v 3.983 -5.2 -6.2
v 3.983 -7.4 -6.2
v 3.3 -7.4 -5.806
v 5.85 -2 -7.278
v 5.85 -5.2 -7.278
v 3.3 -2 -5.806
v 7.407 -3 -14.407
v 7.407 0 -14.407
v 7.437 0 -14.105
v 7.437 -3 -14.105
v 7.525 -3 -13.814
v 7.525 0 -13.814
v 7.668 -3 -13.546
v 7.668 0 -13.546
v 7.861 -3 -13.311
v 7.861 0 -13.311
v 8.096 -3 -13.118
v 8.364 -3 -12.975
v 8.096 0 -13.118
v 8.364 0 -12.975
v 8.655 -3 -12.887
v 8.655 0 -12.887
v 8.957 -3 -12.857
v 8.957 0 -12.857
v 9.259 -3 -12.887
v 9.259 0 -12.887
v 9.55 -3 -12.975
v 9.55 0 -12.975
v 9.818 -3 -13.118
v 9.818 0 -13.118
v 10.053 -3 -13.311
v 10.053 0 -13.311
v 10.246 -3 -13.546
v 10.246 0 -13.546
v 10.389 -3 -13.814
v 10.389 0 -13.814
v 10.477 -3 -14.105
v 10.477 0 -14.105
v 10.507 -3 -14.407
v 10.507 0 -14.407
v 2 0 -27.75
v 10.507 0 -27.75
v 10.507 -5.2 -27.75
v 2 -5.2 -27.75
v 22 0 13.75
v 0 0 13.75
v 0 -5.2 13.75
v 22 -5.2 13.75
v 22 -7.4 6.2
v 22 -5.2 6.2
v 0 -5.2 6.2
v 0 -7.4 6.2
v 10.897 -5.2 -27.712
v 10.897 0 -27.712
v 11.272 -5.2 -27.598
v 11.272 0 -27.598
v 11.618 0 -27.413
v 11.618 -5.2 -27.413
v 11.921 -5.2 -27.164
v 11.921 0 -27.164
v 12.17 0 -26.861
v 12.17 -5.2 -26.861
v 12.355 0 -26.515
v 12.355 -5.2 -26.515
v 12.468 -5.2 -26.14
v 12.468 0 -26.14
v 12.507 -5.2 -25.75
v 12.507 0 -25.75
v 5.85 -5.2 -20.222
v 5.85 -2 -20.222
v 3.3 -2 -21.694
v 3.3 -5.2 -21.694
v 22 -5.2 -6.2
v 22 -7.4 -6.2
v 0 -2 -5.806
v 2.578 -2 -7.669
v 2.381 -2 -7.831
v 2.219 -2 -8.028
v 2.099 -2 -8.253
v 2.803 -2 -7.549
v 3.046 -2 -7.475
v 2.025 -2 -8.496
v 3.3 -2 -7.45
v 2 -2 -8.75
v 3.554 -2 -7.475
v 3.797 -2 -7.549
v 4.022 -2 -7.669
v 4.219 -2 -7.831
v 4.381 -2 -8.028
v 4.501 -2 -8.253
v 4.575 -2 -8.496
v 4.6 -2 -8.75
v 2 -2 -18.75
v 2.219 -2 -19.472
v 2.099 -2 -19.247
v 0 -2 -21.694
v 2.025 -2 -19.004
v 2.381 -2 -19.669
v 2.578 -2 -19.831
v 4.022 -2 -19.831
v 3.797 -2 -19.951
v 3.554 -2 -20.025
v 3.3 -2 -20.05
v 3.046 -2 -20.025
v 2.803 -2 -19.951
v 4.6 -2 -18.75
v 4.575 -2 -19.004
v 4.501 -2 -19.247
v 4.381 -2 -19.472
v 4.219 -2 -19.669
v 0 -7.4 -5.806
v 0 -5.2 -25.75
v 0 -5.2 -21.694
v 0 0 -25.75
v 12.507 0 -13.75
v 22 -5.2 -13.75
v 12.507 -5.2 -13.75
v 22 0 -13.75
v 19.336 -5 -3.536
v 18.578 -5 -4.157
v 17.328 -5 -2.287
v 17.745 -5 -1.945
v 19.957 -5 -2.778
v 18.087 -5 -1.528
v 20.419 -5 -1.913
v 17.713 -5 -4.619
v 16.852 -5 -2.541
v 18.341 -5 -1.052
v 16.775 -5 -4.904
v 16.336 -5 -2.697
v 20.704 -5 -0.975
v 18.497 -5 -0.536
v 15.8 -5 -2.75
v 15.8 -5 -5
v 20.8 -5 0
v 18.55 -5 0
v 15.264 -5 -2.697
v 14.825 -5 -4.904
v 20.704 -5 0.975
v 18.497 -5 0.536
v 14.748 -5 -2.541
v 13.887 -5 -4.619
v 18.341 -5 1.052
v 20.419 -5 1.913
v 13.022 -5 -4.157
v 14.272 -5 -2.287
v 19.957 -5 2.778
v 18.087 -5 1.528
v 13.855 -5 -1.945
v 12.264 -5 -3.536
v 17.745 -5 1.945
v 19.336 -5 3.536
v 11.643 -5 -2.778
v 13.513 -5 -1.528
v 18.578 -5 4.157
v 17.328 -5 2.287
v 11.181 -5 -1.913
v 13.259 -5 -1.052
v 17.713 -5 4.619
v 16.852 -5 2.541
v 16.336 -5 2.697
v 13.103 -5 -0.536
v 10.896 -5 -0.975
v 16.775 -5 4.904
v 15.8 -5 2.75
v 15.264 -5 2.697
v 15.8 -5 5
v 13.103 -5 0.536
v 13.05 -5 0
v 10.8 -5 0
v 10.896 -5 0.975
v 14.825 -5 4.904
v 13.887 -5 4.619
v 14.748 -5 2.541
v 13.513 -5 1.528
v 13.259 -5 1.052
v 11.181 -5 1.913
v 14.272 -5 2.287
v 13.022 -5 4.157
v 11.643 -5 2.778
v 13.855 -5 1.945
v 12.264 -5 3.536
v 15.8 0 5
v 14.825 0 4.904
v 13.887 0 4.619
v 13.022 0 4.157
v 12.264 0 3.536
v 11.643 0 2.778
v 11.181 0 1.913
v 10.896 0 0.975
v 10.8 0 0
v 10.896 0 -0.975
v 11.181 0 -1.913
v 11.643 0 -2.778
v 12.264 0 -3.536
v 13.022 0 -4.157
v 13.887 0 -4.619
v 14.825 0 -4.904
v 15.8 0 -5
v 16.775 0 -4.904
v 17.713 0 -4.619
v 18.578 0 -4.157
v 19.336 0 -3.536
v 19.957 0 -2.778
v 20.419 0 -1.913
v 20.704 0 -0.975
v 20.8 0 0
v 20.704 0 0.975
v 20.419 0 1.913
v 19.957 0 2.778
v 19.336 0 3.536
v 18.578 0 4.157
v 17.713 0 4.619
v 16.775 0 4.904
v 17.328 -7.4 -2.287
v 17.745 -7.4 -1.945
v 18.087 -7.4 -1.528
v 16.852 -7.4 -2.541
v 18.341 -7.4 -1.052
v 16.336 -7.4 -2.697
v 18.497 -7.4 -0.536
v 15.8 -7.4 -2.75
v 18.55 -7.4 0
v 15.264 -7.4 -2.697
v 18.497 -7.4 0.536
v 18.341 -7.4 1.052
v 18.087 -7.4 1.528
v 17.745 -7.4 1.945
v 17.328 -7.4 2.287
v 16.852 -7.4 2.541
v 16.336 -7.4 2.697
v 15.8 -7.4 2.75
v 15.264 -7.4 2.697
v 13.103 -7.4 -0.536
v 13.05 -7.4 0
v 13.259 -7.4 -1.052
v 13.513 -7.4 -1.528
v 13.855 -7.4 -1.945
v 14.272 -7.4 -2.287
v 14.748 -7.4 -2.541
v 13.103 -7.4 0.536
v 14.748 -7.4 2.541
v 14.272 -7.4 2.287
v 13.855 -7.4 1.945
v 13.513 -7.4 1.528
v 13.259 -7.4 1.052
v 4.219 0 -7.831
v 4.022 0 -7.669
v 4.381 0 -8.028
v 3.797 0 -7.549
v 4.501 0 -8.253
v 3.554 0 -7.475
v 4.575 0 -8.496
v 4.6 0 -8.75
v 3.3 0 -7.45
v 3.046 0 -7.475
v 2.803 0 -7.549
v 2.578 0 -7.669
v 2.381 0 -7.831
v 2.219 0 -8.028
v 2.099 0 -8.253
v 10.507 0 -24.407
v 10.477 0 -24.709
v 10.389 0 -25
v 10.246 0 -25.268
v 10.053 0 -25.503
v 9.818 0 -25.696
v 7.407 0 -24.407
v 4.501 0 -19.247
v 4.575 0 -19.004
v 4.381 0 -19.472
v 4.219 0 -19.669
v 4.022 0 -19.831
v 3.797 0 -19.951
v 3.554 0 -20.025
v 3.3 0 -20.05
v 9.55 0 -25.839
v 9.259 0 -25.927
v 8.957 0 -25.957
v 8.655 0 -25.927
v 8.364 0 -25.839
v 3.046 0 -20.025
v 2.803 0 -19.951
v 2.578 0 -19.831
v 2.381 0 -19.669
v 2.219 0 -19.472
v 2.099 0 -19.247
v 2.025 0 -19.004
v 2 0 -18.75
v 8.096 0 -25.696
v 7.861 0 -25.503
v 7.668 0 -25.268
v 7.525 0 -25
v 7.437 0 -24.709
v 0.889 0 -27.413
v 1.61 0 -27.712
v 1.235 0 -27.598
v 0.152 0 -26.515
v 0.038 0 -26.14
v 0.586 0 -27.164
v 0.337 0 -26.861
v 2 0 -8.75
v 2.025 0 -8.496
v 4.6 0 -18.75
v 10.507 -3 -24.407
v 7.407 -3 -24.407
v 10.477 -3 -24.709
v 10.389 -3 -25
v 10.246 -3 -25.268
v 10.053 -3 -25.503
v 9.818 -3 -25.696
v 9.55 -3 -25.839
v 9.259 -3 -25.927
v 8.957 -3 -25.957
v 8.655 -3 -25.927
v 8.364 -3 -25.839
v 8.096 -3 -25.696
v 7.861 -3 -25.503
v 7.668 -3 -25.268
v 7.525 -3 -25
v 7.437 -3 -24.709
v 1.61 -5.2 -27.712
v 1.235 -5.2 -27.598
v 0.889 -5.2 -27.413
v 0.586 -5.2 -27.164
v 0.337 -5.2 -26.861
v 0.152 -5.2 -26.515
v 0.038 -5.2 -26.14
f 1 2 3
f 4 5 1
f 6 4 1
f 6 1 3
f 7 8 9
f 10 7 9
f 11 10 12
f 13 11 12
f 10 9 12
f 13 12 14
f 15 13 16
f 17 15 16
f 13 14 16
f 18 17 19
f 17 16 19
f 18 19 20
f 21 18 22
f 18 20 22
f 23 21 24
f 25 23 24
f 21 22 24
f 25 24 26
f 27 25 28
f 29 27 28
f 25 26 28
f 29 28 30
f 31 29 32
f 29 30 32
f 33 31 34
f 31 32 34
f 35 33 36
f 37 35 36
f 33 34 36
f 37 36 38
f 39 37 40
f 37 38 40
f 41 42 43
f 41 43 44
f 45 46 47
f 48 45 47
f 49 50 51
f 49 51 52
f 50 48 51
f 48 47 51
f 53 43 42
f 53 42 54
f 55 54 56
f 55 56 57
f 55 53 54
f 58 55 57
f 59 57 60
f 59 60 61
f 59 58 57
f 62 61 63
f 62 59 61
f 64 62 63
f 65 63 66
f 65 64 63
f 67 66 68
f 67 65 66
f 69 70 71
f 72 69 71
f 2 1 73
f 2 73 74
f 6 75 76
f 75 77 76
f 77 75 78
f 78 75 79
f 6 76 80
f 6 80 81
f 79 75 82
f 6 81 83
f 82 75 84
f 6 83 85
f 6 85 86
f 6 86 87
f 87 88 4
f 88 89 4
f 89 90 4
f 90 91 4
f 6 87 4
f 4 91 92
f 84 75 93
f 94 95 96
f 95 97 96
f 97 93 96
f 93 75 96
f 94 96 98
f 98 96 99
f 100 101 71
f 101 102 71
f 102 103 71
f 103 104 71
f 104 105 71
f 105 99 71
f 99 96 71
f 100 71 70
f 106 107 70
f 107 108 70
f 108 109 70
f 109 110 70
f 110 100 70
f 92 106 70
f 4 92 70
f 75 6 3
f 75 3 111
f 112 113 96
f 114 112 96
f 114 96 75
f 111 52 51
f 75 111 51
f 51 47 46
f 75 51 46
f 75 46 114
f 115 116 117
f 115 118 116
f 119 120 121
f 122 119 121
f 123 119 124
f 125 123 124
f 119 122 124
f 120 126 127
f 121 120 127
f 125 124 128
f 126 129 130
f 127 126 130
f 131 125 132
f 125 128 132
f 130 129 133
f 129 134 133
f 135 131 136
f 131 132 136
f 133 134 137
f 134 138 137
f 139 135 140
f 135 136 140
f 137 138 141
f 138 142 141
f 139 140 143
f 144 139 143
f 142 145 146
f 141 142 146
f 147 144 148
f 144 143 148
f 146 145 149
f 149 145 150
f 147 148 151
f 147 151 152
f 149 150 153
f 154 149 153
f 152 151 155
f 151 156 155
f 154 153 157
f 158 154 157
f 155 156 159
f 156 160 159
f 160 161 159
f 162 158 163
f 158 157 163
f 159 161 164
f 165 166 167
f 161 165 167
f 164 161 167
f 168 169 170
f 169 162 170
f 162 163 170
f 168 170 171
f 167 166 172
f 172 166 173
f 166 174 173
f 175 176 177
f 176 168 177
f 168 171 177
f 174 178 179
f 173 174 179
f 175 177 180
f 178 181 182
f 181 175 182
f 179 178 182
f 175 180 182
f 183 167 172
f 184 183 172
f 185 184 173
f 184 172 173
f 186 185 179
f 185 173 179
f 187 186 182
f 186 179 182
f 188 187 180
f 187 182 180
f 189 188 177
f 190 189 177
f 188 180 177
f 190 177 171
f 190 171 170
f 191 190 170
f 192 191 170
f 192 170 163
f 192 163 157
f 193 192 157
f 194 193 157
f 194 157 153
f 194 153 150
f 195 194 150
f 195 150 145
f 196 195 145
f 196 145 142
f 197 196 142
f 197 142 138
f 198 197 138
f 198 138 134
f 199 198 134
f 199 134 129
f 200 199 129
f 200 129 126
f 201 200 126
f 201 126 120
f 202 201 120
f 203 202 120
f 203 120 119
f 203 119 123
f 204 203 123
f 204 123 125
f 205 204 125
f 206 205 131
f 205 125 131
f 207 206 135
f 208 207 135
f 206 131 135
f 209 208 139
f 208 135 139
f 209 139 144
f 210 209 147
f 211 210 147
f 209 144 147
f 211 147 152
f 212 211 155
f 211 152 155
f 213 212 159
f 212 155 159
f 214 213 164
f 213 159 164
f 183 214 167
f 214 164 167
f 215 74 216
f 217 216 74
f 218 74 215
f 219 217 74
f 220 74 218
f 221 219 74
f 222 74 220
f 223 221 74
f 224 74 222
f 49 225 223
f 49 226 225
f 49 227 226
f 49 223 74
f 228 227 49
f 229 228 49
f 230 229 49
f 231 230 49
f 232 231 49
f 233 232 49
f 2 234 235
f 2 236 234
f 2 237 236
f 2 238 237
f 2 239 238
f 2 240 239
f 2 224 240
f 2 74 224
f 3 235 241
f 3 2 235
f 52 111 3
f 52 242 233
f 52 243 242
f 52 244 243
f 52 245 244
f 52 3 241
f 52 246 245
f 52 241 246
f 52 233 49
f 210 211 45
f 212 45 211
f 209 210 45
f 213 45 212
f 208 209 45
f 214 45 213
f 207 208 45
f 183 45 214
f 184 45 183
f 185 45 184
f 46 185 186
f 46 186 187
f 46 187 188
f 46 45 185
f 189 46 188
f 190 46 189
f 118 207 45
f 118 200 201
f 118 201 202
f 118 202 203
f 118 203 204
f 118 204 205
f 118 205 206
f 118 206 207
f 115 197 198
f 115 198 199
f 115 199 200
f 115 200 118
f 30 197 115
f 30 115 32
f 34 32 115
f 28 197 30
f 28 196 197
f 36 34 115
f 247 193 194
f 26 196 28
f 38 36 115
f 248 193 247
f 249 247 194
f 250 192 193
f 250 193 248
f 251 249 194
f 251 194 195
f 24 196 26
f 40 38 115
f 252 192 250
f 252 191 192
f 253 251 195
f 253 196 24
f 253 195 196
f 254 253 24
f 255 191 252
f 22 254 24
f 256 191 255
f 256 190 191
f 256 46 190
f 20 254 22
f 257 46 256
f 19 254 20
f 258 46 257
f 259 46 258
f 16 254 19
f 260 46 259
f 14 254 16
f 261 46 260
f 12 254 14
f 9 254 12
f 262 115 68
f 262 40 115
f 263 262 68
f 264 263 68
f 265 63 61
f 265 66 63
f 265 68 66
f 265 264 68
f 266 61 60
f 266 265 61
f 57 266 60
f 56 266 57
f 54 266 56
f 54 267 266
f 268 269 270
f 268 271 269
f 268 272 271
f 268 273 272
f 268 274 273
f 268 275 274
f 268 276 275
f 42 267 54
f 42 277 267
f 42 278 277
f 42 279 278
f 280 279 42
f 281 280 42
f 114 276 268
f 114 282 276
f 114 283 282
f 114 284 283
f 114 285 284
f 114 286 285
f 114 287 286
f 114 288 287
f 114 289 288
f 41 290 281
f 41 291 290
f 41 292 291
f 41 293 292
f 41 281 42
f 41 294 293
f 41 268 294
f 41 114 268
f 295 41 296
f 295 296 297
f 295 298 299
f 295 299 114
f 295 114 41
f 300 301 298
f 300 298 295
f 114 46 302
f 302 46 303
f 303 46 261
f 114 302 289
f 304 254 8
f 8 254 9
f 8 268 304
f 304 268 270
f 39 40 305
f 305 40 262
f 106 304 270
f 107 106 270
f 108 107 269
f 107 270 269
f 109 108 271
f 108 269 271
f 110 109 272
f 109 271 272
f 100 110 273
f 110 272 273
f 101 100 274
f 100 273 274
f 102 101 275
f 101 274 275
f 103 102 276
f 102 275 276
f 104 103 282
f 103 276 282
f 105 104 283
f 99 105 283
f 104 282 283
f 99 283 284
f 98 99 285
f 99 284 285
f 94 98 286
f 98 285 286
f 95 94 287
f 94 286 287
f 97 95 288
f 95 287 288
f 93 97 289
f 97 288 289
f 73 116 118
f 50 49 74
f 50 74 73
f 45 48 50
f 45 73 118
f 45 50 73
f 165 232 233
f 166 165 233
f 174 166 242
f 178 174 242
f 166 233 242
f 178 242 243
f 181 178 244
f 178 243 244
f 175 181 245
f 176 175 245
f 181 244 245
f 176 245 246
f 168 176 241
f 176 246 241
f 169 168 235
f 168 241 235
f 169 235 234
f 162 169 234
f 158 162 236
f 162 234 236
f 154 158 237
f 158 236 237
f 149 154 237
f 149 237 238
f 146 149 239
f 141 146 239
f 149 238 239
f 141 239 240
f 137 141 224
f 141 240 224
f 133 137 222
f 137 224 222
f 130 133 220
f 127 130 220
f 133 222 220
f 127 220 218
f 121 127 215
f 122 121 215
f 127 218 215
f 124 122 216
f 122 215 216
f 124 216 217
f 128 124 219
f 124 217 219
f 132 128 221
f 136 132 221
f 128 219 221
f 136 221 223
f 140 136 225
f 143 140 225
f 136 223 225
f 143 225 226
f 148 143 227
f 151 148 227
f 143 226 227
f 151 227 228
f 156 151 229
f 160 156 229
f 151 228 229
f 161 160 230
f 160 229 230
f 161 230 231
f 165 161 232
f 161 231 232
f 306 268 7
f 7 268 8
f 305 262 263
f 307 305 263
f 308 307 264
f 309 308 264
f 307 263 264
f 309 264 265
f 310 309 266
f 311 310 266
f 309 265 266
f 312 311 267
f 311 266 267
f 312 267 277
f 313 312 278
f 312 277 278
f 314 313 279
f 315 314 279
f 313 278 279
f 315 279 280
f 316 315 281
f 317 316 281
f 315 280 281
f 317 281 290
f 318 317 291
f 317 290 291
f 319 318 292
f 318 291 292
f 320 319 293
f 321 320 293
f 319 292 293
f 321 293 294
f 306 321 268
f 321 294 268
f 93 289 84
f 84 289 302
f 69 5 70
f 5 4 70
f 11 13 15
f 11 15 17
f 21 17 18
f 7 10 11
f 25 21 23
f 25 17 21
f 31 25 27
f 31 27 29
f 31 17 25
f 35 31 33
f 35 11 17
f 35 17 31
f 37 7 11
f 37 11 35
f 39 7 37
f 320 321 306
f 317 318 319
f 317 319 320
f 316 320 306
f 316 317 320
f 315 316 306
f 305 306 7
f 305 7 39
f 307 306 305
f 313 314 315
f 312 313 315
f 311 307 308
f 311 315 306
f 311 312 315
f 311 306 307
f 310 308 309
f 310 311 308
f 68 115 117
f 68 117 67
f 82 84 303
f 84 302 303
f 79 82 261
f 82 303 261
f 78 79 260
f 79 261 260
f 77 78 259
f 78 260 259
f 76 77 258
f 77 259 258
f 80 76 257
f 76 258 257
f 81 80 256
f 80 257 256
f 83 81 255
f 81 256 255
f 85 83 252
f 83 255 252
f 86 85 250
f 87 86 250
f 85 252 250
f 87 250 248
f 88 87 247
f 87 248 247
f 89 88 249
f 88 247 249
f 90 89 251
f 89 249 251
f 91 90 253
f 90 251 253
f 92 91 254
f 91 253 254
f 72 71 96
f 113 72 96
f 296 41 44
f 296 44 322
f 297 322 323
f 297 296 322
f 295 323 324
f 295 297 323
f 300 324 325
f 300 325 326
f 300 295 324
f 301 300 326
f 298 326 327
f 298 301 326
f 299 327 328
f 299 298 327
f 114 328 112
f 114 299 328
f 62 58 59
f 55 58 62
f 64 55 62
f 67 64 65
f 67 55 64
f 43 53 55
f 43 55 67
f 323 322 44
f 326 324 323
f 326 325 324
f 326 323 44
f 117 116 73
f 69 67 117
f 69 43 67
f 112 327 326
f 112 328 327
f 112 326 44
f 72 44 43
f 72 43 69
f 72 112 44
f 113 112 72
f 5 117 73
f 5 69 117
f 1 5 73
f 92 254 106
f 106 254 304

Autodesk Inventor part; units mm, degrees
ref_plane "YZ Plane" through (0, 0, 0) normal (1, 0, 0) x (0, 1, 0)
ref_plane "XZ Plane" through (0, 0, 0) normal (0, 1, 0) x (-1, 0, 0)
ref_plane "XY Plane" through (0, 0, 0) normal (0, 0, 1) x (1, 0, 0)
sketch "Sketch1" plane through (0, 0, 0) normal (1, 0, 0) x (0, 1, 0)
  line L0 (0, 13.75) -> (-5.2, 13.75)
  line L1 (-5.2, 13.75) -> (-5.2, 6.2)
  line L2 (-5.2, 6.2) -> (-7.4, 6.2)
  line L3 (-7.4, 6.2) -> (-7.4, 2.5)
  line L4 (-7.4, 2.5) -> (-13.4, 2.5) construction
  line L5 (-13.4, 2.5) -> (-13.4, -1.6142) construction
  line L6 (-16.08, 0) -> (2.68, 0) construction
  line L7 (0, -13.75) -> (-5.2, -13.75)
  line L8 (-5.2, -13.75) -> (-5.2, -6.2)
  line L9 (-5.2, -6.2) -> (-7.4, -6.2)
  line L10 (-7.4, -6.2) -> (-7.4, -2.5)
  line L11 (-7.4, -2.5) -> (-13.4, -2.5) construction
  line L12 (-13.4, -2.5) -> (-13.4, -1.6142) construction
  line L13 (0, 13.75) -> (0, -13.75)
  line L14 (-7.4, 2.5) -> (-7.4, -2.5)
  point P0 (0, 0)
  dimension "d1" = 5
  dimension "d2" = 3.7
  dimension "d3" = 6
  dimension "d4" = 2.2
  dimension "d5" = 5.2
  dimension "d52" = 27.5
  dimension "d53" = 7.55
extrude "Extrusion1" add sketch "Sketch1" along normal blind 22
sketch "Sketch2" plane through (0, -5.2, -13.75) normal (0, 0, -1) x (-1, 0, 0)
  line L0 (0, 0) -> (0, 5.2) projected
  line L1 (0, 5.2) -> (-22, 5.2) projected
  line L2 (-22, 0) -> (-22, 5.2) projected
  line L3 (0, 0) -> (-22, 0) projected
  point P0 (0, 5.2)
extrude "Extrusion2" add sketch "Sketch2" along normal blind 14
sketch "Sketch3" plane through (0, 0, 13.75) normal (0, 1, 0) x (1, 0, 0)
  circle A0 centre (3.3, 22.5) radius 1.3 construction
  circle A1 centre (8.9569, 28.1569) radius 1.55 construction
  line L0 (3.3, 22.5) -> (8.9569, 28.1569) construction
  line L1 (8.9569, 28.1569) -> (2.1344, 28.1569) construction
  line L2 (0, 0) -> (22, 0) construction
  line L3 (22, 41.5) -> (0, 41.5) construction
  line L4 (3.3, 22.5) -> (3.3, 32.5) construction
  line L5 (8.9569, 28.1569) -> (8.9569, 38.1569) construction
  line L6 (0, 0) -> (0, 41.5) projected
  point P0 (0, 13.75)
  point P1 (6.1284, 25.3284)
  point P2 (3.3, 27.5)
  point P3 (0, 19.95)
  point P4 (0, 27.5)
  point P5 (0, 27.5)
  point P6 (0, 27.5)
  dimension "d10" = 2.6
  dimension "d11" = 3.1
  dimension "d12" = 45
  dimension "d17" = 5
  dimension "d43" = 3.3
  dimension "d44" = 8
  dimension "d46" = 0
sketch "Sketch4" plane through (0, 0, 13.75) normal (0, 1, 0) x (1, 0, 0)
  line L0 (8.9569, 28.1569) -> (8.9569, 38.1569) construction
  line L1 (3.3, 22.5) -> (3.3, 32.5) construction
  line L2 (8.9569, 28.1569) -> (8.9569, 38.1569) construction
  line L3 (10.5069, 28.1569) -> (10.5069, 38.1569)
  line L4 (7.4069, 38.1569) -> (7.4069, 28.1569)
  arc A0 (7.4069, 28.1569) -> (10.5069, 28.1569) centre (8.9569, 28.1569) ccw
  arc A1 (10.5069, 38.1569) -> (7.4069, 38.1569) centre (8.9569, 38.1569) ccw
  circle A2 centre (8.9569, 28.1569) radius 1.55 construction
  circle A3 centre (3.3, 22.5) radius 1.3 construction
  line L5 (3.3, 22.5) -> (3.3, 32.5) construction
  line L6 (4.6, 22.5) -> (4.6, 32.5)
  line L7 (2, 32.5) -> (2, 22.5)
  arc A4 (2, 22.5) -> (4.6, 22.5) centre (3.3, 22.5) ccw
  arc A5 (4.6, 32.5) -> (2, 32.5) centre (3.3, 32.5) ccw
  point P0 (0, 13.75)
  point P1 (8.9569, 33.1569)
  point P2 (3.3, 27.5)
extrude "Extrusion3" cut sketch "Sketch4" against normal blind 3
sketch "Sketch5" plane through (0, 0, 13.75) normal (0, 1, 0) x (1, 0, 0)
  point P0 (0, 13.75)
ref_plane "Work Plane1" through (0, -2, 13.75) normal (0, 1, 0) x (1, 0, 0)
sketch "Sketch6" plane through (0, -2, 13.75) normal (0, 1, 0) x (1, 0, 0)
  line L0 (0.75, 23.9722) -> (3.3, 25.4445) construction
  line L1 (3.3, 25.4445) -> (5.85, 23.9722) construction
  line L2 (5.85, 23.9722) -> (5.85, 21.0278) construction
  line L3 (5.85, 21.0278) -> (3.3, 19.5555)
  line L4 (0.75, 21.0278) -> (0.75, 23.9722) construction
  line L5 (2, 22.5) -> (2, 32.5) construction
  line L6 (2, 27.5) -> (4.6, 27.5) construction
  line L7 (4.6, 32.5) -> (4.6, 22.5) construction
  line L8 (5.85, 33.9722) -> (3.3, 35.4445)
  line L9 (5.85, 21.0278) -> (5.85, 33.9722)
  line L10 (3.3, 19.5555) -> (0, 19.5555)
  line L11 (0, 7.55) -> (0, 19.95) projected
  line L12 (3.3, 35.4445) -> (0, 35.4445)
  line L13 (0, 0) -> (0, 41.5) projected
  line L14 (0, 19.5555) -> (0, 35.4445)
  point P0 (0, 13.75)
  point P1 (3.3, 22.5)
  point P2 (3.3, 22.5)
  point P3 (3.3, 27.5)
  point P4 (0, 11.25)
  dimension "d21" = 5.1
extrude "Extrusion4" cut sketch "Sketch6" against normal through all
sketch "Sketch7" plane through (0, 0, 13.75) normal (0, 1, 0) x (1, 0, 0)
  line L0 (32.7, 13.75) -> (-26.1, 13.75) construction
  circle A0 centre (15.8, 13.75) radius 4.5
  line L1 (22, 0) -> (22, 41.5) projected
  circle A1 centre (3.3, 22.5) radius 7 construction
  line L2 (0, 0) -> (22, 0) construction
  line L3 (10.3, 0) -> (10.3, 41.5) construction
  line L4 (22, 41.5) -> (0, 41.5) construction
  line L5 (11.3, 0) -> (11.3, 41.5) construction
  point P0 (0, 13.75)
  dimension "d24" = 9
  dimension "d39" = 14
  dimension "d41" = 1
hole "Hole1" at (15.8, 0, 0) direction (0, -1, 0) diameter 5.5 end through all counterbore diameter 10 counterbore depth 5 clearance for "Socket Head Cap Screw ISO 4762" size "M5" standard "ISO"
sketch "Sketch9" plane through (0, 0, 13.75) normal (0, 1, 0) x (1, 0, 0)
  line L0 (22, 19.95) -> (22, 41.5) projected
  line L1 (22, 27.5) -> (12.5069, 27.5)
  line L2 (12.5069, 27.5) -> (12.5069, 41.5)
  line L3 (12.5069, 41.5) -> (22, 41.5)
  line L4 (22, 41.5) -> (22, 27.5)
  line L5 (10.5069, 38.1569) -> (10.5069, 28.1569) projected
  line L6 (0, 41.5) -> (22, 41.5) projected
  point P0 (0, 13.75)
  point P1 (10.5069, 37.5)
  point P2 (0, 27.5)
  point P3 (0, 27.5)
  point P4 (0, 27.5)
  dimension "d45" = 2
extrude "Extrusion6" cut sketch "Sketch9" against normal through all
fillet "Fillet1" radius 2 1 edges at (12.5069, -2.6, -27.75)
fillet "Fillet2" radius 2 1 edges at (0, -2.6, -27.75)
sketch "Sketch10" plane through (0, 0, 13.75) normal (0, 1, 0) x (1, 0, 0)
  circle A0 centre (3.3, 22.5) radius 21 construction
  point P0 (0, 13.75)
  dimension "d51" = 42
properties part number "Dreiwegehahn_Montage45"
